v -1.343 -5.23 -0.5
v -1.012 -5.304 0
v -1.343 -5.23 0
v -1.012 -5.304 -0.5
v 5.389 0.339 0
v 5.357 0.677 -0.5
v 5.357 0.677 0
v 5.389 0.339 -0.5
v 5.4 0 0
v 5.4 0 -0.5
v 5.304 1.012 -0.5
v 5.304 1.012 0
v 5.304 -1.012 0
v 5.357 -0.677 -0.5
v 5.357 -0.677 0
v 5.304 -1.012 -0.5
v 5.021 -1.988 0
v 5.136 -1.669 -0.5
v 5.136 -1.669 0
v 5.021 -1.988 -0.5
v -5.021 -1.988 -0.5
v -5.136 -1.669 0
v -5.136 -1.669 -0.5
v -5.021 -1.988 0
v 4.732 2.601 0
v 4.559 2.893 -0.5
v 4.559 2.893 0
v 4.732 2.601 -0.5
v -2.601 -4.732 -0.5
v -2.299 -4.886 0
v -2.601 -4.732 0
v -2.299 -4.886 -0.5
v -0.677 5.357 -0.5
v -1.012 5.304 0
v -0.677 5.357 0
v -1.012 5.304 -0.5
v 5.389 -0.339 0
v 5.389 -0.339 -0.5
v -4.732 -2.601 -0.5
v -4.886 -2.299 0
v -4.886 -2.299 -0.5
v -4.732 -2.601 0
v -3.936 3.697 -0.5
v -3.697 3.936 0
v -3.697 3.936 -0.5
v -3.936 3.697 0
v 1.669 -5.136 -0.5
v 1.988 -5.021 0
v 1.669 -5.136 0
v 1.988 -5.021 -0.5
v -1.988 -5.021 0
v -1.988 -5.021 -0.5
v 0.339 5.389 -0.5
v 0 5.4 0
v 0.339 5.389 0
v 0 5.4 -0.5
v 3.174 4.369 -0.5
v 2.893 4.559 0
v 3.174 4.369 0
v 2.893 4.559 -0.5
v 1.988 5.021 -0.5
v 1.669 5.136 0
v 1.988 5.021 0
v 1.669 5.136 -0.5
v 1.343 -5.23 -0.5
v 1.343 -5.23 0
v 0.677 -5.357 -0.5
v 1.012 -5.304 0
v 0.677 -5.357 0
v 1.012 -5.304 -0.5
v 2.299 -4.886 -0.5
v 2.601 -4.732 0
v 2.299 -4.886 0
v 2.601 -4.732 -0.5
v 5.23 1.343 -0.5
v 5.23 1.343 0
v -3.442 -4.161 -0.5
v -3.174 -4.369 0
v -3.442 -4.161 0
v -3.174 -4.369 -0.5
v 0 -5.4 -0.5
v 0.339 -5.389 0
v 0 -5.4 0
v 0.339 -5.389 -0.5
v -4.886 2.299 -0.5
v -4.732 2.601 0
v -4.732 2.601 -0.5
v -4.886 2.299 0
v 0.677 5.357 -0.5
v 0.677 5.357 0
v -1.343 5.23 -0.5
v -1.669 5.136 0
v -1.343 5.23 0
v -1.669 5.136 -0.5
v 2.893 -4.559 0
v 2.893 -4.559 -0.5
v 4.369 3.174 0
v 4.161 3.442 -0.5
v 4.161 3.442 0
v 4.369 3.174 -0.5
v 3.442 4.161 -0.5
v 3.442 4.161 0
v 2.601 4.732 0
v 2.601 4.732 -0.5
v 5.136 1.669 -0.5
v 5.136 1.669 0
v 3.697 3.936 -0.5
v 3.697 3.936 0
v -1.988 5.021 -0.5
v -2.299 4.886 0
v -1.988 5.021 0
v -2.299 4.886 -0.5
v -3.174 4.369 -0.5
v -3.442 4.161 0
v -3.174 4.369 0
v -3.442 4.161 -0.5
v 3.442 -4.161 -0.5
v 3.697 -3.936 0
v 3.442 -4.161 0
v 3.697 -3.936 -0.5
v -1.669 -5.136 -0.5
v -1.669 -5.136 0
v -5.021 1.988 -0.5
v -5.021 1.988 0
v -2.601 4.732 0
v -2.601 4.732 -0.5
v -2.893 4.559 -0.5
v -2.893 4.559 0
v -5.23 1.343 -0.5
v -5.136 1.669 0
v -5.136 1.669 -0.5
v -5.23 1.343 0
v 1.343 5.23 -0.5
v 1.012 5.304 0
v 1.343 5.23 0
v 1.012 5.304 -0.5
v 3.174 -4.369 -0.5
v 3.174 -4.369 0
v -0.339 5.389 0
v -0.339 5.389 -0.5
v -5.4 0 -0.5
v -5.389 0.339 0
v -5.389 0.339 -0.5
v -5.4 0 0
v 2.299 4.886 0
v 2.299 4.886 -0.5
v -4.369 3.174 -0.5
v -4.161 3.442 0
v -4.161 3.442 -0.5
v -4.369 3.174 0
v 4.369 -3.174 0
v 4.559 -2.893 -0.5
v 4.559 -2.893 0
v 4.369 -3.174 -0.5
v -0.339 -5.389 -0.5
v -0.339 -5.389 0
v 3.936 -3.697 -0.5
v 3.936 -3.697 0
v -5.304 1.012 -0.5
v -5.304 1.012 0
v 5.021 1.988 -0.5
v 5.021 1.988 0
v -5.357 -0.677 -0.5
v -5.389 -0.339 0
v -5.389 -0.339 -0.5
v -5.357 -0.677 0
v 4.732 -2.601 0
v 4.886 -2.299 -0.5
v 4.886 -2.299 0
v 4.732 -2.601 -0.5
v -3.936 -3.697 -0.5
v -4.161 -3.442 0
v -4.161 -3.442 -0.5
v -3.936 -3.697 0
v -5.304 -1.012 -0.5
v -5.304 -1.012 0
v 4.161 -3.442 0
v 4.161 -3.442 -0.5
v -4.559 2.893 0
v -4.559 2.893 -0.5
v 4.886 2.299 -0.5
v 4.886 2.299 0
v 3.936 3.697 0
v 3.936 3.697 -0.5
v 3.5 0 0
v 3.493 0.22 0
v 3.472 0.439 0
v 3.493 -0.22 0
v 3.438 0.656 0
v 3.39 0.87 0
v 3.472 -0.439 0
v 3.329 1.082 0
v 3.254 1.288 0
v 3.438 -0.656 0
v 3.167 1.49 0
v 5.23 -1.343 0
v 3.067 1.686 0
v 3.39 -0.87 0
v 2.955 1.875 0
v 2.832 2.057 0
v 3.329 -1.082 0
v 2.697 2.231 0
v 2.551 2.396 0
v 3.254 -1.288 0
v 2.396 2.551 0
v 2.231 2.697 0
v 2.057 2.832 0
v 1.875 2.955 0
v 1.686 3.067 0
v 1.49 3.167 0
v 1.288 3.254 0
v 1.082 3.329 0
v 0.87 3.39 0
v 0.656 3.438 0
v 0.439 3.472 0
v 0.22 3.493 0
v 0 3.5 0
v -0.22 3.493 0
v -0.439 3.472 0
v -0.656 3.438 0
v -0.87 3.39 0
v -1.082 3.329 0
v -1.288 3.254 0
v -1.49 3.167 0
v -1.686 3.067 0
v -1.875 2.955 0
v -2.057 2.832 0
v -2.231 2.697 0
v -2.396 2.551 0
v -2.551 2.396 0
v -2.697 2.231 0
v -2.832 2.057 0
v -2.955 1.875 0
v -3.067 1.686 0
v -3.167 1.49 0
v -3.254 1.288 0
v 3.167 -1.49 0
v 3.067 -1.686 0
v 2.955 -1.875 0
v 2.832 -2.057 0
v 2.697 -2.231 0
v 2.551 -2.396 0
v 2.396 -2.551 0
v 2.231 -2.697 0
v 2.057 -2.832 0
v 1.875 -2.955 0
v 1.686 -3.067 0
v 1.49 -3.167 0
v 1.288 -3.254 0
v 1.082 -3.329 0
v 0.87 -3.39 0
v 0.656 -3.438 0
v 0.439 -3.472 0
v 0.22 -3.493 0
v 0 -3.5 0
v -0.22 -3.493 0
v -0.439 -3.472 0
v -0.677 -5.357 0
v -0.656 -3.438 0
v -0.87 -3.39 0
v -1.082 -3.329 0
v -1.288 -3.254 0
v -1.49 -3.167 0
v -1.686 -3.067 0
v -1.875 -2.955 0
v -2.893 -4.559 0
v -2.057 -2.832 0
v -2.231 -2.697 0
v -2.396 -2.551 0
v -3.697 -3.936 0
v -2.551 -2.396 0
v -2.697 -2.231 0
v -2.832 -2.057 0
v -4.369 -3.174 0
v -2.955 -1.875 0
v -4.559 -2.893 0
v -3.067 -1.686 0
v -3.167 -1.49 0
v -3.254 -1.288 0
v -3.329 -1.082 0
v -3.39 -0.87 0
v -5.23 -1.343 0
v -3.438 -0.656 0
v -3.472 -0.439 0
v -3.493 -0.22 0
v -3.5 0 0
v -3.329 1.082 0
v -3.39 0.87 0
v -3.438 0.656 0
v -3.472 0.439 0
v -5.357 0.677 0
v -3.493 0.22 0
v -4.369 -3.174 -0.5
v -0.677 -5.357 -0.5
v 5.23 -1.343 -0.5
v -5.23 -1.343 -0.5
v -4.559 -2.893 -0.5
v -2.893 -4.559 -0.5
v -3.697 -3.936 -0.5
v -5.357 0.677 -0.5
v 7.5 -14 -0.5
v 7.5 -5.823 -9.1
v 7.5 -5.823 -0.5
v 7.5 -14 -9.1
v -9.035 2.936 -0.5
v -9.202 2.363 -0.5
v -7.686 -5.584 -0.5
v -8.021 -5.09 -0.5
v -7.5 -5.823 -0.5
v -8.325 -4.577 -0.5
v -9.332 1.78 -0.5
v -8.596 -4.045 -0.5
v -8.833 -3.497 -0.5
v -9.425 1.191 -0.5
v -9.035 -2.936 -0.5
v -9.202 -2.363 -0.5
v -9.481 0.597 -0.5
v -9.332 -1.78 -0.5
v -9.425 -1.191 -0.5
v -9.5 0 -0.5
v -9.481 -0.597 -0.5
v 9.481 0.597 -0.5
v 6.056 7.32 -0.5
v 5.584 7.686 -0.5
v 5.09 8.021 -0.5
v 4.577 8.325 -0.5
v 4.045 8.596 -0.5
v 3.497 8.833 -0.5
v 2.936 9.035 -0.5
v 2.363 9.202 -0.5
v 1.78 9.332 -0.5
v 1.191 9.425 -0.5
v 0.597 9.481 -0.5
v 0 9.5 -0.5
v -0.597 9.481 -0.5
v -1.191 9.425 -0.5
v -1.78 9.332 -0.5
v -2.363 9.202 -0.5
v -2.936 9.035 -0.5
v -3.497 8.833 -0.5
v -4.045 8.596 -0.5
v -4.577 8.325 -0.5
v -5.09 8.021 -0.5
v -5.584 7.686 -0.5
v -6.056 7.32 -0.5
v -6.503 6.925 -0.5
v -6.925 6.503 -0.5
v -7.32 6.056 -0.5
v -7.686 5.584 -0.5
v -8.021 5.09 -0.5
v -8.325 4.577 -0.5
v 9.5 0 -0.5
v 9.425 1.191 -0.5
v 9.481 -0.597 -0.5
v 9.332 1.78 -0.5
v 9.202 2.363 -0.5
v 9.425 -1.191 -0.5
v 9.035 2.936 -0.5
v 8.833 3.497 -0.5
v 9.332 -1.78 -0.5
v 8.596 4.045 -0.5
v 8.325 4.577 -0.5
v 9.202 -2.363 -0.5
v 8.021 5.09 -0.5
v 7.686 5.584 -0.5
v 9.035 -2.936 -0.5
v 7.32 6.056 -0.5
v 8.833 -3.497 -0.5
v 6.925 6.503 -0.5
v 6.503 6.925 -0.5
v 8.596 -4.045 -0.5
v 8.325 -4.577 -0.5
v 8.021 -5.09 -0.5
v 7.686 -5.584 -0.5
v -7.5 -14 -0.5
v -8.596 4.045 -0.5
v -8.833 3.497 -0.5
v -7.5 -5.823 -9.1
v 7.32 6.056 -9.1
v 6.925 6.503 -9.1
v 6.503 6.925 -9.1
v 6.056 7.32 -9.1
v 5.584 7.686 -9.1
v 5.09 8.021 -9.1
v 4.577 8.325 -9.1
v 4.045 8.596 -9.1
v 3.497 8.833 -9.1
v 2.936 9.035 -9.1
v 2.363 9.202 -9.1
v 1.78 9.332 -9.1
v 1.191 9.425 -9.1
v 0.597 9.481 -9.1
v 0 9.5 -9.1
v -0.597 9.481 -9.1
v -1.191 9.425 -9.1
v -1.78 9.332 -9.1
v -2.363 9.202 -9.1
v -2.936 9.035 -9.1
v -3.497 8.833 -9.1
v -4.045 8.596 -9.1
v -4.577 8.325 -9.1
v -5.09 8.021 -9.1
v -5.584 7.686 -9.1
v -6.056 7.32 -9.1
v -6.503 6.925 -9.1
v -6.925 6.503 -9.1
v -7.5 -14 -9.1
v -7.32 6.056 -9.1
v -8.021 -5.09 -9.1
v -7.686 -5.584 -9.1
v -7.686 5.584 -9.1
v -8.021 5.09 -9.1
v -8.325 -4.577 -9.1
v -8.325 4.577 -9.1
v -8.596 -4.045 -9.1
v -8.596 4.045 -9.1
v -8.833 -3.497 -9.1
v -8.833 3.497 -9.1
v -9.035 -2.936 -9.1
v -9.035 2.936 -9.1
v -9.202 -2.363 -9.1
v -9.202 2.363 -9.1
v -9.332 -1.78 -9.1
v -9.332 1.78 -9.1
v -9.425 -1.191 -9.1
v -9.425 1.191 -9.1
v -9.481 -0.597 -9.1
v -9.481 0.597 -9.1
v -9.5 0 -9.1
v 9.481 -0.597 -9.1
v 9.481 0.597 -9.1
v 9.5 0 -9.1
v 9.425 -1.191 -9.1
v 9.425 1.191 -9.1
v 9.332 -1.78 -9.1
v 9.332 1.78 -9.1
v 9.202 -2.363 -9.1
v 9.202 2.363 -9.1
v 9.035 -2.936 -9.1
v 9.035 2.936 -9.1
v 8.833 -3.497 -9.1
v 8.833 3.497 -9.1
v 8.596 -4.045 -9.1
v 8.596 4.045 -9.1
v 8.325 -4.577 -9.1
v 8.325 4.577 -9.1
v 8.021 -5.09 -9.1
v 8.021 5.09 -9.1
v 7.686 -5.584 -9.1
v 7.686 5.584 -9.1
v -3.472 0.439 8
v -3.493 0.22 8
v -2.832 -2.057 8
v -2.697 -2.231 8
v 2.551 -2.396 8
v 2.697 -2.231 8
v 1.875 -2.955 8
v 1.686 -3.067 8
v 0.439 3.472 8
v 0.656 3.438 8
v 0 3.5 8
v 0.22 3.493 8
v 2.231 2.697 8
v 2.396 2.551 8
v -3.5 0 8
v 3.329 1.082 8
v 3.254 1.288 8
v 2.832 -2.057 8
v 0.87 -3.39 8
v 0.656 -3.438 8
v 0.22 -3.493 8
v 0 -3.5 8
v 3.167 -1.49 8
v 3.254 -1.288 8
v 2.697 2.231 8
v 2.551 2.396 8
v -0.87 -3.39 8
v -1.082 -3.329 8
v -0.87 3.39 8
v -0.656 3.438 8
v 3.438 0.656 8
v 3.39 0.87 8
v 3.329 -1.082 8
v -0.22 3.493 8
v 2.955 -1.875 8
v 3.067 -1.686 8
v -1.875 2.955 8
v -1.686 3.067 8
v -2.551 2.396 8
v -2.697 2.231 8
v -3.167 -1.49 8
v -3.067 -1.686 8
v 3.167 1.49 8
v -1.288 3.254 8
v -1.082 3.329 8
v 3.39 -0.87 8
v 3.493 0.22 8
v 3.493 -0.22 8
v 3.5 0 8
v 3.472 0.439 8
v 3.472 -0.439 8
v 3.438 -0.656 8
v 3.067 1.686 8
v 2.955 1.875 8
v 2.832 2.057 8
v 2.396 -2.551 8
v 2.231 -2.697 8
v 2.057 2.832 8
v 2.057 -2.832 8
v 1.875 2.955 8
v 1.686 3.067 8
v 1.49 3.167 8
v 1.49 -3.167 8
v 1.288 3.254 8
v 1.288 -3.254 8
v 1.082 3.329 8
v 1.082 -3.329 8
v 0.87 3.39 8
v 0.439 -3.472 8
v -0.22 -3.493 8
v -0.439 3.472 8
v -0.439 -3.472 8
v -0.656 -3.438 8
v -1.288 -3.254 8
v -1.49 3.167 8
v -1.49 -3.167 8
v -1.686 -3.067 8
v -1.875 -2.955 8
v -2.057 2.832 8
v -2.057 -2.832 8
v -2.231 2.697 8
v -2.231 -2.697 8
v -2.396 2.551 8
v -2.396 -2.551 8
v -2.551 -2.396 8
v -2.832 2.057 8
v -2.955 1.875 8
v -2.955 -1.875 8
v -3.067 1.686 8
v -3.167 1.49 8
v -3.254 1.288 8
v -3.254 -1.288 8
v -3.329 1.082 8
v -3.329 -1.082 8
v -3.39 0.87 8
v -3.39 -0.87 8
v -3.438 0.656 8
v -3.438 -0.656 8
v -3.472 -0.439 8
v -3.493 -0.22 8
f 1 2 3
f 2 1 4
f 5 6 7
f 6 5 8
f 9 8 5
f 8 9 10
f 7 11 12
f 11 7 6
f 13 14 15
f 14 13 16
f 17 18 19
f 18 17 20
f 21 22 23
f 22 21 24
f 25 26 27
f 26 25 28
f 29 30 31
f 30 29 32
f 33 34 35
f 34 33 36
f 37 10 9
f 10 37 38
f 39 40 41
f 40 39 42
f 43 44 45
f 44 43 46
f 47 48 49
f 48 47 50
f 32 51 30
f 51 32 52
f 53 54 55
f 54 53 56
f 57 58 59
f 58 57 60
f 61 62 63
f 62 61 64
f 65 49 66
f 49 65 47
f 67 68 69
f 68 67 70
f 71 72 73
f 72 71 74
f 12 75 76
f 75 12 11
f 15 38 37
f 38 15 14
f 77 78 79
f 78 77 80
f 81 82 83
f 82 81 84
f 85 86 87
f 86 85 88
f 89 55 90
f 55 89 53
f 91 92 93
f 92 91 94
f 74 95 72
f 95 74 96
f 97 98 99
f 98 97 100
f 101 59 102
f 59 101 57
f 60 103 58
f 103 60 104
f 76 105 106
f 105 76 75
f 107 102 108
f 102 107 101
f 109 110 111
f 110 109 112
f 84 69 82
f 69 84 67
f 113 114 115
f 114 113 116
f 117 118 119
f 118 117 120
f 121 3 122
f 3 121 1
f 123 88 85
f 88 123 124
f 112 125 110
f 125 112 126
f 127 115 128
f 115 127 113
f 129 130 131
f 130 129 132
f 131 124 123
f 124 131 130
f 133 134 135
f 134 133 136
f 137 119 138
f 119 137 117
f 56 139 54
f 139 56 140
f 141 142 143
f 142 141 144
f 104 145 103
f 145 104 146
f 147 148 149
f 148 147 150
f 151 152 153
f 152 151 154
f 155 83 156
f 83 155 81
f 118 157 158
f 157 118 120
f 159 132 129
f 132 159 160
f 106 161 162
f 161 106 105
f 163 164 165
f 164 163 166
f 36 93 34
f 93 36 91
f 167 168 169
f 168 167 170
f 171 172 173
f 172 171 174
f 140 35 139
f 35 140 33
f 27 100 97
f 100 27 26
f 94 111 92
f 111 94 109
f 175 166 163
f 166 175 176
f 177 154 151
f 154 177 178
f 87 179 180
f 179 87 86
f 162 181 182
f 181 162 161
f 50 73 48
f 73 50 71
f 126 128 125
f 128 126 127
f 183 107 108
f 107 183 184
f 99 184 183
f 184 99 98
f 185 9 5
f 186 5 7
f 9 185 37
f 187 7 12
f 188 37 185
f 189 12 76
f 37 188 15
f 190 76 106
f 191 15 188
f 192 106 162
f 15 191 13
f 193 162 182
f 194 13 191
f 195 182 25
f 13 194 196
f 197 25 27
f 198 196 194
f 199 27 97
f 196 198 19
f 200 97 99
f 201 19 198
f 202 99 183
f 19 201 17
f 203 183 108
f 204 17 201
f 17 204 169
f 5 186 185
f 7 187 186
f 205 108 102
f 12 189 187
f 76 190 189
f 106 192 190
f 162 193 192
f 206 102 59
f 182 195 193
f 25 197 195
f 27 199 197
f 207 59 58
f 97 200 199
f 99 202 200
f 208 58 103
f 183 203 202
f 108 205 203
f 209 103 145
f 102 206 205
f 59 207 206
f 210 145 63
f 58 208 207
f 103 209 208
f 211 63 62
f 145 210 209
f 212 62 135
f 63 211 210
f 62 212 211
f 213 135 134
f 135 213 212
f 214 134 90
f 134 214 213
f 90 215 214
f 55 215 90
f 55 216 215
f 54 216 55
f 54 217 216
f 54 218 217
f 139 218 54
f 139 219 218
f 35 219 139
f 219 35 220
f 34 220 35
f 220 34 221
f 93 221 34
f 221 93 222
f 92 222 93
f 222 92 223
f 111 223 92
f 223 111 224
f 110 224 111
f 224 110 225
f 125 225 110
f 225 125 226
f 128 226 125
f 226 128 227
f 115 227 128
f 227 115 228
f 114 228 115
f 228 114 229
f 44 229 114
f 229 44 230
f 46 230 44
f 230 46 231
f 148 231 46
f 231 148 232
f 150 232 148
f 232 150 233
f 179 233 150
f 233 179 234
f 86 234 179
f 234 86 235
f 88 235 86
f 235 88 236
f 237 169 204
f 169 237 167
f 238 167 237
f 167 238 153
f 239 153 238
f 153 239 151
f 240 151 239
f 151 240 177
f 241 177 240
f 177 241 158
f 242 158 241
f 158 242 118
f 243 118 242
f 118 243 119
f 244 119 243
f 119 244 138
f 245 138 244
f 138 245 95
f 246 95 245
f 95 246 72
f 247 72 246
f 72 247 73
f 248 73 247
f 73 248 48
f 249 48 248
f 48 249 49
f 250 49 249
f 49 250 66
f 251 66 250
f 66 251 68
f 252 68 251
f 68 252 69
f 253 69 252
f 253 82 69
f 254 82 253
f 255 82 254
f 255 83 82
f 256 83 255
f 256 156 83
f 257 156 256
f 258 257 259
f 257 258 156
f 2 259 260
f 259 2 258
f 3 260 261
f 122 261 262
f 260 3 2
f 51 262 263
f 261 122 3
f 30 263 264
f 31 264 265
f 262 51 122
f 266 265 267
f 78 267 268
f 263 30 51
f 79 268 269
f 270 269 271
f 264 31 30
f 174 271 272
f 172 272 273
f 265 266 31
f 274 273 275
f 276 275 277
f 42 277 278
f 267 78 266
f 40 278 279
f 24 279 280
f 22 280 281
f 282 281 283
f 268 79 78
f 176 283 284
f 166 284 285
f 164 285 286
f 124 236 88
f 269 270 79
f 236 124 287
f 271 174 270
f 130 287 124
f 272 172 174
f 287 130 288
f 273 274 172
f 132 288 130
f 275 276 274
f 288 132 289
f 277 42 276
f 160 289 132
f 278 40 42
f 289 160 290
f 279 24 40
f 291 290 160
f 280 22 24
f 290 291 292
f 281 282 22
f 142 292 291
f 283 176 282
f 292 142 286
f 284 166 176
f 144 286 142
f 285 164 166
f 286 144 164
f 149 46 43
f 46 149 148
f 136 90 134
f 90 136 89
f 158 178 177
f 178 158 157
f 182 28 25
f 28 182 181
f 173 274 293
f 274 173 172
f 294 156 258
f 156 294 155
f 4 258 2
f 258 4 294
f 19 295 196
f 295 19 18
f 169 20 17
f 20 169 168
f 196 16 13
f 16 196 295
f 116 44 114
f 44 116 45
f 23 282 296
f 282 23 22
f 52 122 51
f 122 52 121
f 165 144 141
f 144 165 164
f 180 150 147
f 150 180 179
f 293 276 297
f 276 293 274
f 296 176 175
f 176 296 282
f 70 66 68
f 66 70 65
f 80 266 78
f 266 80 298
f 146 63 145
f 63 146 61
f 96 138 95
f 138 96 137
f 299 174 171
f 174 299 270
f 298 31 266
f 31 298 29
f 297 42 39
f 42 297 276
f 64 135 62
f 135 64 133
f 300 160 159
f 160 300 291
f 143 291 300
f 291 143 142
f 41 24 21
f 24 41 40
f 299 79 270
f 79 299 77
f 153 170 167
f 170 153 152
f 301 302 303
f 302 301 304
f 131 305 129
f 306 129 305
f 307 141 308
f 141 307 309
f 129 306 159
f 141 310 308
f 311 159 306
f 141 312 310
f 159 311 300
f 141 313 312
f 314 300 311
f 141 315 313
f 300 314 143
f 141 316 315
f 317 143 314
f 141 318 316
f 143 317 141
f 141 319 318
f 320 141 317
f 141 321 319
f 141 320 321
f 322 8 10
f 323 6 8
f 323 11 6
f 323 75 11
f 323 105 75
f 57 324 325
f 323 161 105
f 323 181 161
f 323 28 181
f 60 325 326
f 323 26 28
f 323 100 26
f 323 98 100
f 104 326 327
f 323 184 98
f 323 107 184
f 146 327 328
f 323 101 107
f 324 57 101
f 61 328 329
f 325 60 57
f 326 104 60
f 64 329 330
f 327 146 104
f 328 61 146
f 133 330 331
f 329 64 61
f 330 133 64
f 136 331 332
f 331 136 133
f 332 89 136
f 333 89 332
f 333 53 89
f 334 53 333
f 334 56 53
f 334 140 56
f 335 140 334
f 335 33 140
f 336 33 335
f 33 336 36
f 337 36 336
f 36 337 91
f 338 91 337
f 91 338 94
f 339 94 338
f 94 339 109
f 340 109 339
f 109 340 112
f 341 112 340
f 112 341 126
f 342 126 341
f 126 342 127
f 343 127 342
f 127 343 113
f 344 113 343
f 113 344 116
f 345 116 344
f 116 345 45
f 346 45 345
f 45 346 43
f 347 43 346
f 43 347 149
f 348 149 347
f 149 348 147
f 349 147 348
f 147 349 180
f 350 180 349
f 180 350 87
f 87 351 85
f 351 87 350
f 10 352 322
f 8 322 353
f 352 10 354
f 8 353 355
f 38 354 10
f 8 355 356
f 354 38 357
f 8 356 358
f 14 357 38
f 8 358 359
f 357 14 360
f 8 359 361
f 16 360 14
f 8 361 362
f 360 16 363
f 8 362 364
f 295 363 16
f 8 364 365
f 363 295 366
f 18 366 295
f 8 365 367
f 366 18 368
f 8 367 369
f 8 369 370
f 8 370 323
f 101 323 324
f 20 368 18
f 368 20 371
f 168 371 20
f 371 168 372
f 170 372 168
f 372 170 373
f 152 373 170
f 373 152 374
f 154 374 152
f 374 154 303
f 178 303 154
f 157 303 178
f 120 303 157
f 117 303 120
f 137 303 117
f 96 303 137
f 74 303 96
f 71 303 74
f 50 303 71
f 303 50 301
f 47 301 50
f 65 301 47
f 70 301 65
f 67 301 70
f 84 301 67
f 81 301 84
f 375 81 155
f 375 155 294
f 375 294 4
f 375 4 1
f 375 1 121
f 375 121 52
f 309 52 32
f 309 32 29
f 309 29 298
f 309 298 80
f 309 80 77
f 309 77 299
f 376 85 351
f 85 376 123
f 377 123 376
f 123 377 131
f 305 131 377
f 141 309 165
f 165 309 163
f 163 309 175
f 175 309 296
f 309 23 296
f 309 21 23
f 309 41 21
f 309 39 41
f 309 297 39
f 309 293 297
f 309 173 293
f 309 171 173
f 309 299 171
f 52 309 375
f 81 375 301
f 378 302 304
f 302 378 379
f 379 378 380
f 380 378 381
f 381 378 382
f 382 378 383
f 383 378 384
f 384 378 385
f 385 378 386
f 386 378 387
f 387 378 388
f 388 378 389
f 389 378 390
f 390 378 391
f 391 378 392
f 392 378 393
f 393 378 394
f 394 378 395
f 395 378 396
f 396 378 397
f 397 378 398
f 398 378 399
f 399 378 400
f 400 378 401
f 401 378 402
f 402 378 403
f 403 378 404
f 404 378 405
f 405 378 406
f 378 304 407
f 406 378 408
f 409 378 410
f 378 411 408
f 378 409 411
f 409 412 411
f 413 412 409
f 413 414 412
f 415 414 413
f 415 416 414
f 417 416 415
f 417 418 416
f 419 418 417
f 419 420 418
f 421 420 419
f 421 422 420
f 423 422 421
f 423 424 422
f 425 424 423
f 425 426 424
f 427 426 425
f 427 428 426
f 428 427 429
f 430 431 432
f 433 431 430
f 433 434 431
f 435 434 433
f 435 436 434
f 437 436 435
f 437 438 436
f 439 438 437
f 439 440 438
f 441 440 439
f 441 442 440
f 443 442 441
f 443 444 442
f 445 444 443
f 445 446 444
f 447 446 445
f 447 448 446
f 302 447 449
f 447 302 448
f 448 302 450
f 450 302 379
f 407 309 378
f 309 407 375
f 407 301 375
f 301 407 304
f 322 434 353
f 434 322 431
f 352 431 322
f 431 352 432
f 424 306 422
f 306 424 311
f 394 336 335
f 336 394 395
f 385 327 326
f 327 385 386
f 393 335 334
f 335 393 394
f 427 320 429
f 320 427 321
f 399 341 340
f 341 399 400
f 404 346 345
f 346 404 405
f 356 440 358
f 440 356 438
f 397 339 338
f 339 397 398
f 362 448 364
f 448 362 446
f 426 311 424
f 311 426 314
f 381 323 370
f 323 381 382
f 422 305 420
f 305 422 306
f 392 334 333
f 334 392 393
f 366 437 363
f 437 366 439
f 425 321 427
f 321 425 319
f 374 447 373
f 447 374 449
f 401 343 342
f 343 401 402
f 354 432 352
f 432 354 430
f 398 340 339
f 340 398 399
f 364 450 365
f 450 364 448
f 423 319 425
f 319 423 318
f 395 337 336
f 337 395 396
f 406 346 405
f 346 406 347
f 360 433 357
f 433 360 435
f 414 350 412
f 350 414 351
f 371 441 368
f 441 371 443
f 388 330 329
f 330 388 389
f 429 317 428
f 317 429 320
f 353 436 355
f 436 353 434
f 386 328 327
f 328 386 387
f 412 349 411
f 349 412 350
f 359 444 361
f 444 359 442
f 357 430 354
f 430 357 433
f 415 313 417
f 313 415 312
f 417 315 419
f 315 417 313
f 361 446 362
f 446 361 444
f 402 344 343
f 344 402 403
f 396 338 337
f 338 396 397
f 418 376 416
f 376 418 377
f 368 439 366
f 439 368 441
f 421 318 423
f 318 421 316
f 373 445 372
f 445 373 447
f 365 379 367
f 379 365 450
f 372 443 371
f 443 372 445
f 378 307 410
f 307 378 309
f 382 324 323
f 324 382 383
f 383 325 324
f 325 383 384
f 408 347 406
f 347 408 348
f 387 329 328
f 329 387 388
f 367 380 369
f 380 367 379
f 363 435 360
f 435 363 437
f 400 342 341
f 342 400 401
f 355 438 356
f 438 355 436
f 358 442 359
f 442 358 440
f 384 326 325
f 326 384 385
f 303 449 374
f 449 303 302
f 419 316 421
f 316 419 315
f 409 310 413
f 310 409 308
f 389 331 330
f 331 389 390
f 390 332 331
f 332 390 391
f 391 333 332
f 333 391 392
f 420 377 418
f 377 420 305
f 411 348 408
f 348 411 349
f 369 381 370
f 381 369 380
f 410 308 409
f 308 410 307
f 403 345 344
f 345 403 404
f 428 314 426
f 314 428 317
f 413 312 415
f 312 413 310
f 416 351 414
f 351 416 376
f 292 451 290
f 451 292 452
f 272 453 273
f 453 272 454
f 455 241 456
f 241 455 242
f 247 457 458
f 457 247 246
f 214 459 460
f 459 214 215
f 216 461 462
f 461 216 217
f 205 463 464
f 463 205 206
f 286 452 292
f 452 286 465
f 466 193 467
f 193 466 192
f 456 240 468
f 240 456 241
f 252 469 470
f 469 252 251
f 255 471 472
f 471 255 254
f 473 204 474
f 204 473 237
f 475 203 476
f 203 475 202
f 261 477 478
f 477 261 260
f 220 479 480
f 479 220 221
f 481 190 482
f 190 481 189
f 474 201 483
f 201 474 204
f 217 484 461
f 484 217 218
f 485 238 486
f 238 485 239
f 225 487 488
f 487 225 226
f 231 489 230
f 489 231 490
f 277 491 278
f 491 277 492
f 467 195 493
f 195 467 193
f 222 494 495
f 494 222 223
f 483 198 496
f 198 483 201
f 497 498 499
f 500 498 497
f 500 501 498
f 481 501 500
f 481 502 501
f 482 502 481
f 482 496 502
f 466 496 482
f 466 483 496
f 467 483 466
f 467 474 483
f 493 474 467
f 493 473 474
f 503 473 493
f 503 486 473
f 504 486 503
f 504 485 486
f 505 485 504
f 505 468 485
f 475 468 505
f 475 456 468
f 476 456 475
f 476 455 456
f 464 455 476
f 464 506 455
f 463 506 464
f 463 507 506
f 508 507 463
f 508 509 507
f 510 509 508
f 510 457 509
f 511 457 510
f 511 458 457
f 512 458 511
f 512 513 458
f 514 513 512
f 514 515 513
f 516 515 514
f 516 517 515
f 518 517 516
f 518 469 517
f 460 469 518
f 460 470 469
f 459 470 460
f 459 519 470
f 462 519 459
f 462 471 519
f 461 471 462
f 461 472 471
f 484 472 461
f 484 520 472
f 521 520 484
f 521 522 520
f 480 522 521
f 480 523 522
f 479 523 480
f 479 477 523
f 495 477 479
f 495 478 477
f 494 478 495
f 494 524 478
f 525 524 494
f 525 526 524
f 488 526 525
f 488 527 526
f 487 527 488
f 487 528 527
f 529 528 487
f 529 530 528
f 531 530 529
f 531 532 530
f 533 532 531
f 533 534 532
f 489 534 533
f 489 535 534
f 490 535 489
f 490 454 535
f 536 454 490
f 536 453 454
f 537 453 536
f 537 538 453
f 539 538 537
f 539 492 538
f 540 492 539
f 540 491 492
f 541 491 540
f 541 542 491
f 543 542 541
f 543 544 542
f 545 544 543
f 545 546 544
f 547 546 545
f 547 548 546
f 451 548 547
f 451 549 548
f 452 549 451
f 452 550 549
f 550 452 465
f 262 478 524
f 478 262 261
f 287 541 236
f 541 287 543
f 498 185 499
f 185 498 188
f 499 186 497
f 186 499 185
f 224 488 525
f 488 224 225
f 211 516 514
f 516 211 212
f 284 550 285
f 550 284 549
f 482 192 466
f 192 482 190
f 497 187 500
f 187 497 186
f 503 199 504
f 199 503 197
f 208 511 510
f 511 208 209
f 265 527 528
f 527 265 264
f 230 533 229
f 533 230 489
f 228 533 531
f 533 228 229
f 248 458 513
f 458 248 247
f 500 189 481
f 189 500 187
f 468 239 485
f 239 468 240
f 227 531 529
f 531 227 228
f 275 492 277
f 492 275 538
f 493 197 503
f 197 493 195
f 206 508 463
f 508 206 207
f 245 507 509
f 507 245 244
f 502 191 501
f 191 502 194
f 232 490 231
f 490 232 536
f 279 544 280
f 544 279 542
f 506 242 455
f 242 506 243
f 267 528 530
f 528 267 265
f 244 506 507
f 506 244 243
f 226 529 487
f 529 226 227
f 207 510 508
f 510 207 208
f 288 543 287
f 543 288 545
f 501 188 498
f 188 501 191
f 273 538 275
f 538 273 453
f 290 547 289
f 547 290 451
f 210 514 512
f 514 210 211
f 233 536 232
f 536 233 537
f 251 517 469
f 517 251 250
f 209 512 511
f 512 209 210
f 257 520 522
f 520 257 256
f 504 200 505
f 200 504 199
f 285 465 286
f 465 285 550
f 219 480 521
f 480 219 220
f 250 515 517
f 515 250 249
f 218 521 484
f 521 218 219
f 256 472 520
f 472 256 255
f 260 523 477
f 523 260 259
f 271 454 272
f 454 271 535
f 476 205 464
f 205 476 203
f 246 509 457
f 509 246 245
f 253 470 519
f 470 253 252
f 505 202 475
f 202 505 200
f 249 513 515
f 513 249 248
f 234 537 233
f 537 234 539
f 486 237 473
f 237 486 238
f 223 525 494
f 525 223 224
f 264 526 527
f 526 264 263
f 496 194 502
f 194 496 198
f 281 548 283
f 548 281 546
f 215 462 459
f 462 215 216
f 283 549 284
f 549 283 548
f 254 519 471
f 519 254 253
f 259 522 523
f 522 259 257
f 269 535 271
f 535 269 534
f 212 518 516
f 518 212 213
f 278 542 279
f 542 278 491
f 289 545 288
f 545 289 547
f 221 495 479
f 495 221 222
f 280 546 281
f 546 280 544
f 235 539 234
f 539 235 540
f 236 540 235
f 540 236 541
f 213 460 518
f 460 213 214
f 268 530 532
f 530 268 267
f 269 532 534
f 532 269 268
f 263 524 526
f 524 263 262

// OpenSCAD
$fn=100; 

module pot_alpha_16mm(){
    
    
    shaft_height = 8;
    translate([0, 0, shaft_height/2]){
        cylinder(r=3.5, h=shaft_height, center=true);
    }
    
    translate([0, 0, -0.5]){
        cylinder(r=5.4, h=1, center=true);
        
        body_height = 8.6;
        
        translate([-7.5, -14, -body_height]) cube([15, 14, body_height]);
        translate([0, 0, -body_height/2]){
            cylinder(r=9.5, h=body_height, center=true);
            
        }      
    }
    

}

pot_alpha_16mm();
